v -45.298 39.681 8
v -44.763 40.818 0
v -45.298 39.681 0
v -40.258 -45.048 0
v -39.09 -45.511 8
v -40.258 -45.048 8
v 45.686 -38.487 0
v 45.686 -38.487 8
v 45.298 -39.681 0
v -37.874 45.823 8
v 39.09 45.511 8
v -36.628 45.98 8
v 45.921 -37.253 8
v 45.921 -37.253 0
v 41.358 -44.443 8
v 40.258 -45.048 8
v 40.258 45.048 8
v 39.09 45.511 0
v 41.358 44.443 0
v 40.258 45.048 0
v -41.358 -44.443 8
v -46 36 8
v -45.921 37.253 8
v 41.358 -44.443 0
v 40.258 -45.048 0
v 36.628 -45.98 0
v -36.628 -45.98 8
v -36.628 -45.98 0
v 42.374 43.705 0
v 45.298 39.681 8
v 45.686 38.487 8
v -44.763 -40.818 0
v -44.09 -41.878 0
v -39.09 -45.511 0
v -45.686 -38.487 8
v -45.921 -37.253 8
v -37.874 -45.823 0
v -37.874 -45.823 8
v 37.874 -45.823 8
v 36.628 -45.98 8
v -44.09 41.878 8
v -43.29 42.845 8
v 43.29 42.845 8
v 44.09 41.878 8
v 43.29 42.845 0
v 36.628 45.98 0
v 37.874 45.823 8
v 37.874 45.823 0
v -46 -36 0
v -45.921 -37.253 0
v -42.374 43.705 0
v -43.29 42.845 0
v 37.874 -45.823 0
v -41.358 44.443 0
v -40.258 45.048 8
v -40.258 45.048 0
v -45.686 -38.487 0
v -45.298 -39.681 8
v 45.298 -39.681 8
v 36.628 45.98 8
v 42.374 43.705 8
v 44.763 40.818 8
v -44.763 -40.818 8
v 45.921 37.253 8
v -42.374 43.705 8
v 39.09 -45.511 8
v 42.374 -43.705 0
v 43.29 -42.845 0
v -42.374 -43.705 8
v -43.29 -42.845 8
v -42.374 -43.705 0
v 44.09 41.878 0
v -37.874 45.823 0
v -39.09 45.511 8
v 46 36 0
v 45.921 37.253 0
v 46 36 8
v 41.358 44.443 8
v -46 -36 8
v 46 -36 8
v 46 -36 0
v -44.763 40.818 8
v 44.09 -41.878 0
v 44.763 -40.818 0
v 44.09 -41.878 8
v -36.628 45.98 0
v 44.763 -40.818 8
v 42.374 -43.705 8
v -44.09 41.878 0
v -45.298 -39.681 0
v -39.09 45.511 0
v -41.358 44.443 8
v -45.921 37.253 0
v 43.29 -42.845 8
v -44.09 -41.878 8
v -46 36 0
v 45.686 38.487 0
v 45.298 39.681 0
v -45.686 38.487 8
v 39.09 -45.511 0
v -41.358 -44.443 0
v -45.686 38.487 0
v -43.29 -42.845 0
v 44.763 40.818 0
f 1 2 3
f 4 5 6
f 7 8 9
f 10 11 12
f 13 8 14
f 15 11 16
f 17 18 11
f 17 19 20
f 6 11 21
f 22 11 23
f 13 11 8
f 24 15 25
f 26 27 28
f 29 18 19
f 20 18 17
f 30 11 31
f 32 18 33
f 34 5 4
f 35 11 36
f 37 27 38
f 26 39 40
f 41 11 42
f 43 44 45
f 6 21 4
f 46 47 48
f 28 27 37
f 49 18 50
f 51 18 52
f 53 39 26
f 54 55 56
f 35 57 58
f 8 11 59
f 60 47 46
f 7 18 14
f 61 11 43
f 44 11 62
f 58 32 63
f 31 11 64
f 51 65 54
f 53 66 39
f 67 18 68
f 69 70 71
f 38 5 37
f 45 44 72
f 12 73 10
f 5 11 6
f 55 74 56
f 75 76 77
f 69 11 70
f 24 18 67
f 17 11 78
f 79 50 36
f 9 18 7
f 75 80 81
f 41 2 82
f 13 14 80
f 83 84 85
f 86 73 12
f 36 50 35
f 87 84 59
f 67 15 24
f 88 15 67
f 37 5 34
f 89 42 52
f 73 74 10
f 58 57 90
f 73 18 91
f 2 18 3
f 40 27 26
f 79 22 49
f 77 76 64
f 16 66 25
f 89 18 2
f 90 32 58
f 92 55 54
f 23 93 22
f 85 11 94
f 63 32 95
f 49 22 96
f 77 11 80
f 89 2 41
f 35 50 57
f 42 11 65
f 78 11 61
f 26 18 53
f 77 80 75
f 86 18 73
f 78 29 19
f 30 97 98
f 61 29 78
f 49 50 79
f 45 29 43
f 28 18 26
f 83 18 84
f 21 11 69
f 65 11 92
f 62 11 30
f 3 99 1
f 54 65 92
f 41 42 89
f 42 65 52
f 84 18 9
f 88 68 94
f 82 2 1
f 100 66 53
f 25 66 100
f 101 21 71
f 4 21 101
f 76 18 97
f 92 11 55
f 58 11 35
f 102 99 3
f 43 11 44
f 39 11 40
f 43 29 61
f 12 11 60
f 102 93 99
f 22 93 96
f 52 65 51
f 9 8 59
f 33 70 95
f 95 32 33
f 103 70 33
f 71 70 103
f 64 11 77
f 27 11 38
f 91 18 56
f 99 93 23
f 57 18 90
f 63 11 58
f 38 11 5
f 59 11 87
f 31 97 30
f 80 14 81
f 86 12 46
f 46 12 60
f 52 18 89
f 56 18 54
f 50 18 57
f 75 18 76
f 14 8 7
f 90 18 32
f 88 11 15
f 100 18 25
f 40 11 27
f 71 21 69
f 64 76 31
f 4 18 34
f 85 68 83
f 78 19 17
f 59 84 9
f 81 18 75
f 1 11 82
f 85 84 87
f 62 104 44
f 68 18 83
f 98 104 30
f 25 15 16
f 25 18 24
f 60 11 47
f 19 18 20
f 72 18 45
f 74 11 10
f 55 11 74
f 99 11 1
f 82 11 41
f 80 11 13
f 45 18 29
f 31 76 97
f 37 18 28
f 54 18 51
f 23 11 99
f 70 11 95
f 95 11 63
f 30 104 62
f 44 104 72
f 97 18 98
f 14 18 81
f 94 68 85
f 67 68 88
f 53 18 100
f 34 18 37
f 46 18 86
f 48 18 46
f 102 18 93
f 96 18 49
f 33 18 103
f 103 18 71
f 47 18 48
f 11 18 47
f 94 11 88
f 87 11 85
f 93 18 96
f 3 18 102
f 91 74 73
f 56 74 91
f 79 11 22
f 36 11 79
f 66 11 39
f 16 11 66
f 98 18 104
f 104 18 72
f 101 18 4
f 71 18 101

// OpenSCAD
WIDTH = 92;
LENGTH = 92;
HEIGHT = 8;
CORNER_DIA = 20;

$fn = 50;

hull() {
    for(i = [-1, 1]) {
        for(j = [-1, 1]) {
            translate([i * (WIDTH-CORNER_DIA)/2, j * (LENGTH-CORNER_DIA)/2, 0])
            cylinder(d = CORNER_DIA, h = HEIGHT);
        }
    }
}
